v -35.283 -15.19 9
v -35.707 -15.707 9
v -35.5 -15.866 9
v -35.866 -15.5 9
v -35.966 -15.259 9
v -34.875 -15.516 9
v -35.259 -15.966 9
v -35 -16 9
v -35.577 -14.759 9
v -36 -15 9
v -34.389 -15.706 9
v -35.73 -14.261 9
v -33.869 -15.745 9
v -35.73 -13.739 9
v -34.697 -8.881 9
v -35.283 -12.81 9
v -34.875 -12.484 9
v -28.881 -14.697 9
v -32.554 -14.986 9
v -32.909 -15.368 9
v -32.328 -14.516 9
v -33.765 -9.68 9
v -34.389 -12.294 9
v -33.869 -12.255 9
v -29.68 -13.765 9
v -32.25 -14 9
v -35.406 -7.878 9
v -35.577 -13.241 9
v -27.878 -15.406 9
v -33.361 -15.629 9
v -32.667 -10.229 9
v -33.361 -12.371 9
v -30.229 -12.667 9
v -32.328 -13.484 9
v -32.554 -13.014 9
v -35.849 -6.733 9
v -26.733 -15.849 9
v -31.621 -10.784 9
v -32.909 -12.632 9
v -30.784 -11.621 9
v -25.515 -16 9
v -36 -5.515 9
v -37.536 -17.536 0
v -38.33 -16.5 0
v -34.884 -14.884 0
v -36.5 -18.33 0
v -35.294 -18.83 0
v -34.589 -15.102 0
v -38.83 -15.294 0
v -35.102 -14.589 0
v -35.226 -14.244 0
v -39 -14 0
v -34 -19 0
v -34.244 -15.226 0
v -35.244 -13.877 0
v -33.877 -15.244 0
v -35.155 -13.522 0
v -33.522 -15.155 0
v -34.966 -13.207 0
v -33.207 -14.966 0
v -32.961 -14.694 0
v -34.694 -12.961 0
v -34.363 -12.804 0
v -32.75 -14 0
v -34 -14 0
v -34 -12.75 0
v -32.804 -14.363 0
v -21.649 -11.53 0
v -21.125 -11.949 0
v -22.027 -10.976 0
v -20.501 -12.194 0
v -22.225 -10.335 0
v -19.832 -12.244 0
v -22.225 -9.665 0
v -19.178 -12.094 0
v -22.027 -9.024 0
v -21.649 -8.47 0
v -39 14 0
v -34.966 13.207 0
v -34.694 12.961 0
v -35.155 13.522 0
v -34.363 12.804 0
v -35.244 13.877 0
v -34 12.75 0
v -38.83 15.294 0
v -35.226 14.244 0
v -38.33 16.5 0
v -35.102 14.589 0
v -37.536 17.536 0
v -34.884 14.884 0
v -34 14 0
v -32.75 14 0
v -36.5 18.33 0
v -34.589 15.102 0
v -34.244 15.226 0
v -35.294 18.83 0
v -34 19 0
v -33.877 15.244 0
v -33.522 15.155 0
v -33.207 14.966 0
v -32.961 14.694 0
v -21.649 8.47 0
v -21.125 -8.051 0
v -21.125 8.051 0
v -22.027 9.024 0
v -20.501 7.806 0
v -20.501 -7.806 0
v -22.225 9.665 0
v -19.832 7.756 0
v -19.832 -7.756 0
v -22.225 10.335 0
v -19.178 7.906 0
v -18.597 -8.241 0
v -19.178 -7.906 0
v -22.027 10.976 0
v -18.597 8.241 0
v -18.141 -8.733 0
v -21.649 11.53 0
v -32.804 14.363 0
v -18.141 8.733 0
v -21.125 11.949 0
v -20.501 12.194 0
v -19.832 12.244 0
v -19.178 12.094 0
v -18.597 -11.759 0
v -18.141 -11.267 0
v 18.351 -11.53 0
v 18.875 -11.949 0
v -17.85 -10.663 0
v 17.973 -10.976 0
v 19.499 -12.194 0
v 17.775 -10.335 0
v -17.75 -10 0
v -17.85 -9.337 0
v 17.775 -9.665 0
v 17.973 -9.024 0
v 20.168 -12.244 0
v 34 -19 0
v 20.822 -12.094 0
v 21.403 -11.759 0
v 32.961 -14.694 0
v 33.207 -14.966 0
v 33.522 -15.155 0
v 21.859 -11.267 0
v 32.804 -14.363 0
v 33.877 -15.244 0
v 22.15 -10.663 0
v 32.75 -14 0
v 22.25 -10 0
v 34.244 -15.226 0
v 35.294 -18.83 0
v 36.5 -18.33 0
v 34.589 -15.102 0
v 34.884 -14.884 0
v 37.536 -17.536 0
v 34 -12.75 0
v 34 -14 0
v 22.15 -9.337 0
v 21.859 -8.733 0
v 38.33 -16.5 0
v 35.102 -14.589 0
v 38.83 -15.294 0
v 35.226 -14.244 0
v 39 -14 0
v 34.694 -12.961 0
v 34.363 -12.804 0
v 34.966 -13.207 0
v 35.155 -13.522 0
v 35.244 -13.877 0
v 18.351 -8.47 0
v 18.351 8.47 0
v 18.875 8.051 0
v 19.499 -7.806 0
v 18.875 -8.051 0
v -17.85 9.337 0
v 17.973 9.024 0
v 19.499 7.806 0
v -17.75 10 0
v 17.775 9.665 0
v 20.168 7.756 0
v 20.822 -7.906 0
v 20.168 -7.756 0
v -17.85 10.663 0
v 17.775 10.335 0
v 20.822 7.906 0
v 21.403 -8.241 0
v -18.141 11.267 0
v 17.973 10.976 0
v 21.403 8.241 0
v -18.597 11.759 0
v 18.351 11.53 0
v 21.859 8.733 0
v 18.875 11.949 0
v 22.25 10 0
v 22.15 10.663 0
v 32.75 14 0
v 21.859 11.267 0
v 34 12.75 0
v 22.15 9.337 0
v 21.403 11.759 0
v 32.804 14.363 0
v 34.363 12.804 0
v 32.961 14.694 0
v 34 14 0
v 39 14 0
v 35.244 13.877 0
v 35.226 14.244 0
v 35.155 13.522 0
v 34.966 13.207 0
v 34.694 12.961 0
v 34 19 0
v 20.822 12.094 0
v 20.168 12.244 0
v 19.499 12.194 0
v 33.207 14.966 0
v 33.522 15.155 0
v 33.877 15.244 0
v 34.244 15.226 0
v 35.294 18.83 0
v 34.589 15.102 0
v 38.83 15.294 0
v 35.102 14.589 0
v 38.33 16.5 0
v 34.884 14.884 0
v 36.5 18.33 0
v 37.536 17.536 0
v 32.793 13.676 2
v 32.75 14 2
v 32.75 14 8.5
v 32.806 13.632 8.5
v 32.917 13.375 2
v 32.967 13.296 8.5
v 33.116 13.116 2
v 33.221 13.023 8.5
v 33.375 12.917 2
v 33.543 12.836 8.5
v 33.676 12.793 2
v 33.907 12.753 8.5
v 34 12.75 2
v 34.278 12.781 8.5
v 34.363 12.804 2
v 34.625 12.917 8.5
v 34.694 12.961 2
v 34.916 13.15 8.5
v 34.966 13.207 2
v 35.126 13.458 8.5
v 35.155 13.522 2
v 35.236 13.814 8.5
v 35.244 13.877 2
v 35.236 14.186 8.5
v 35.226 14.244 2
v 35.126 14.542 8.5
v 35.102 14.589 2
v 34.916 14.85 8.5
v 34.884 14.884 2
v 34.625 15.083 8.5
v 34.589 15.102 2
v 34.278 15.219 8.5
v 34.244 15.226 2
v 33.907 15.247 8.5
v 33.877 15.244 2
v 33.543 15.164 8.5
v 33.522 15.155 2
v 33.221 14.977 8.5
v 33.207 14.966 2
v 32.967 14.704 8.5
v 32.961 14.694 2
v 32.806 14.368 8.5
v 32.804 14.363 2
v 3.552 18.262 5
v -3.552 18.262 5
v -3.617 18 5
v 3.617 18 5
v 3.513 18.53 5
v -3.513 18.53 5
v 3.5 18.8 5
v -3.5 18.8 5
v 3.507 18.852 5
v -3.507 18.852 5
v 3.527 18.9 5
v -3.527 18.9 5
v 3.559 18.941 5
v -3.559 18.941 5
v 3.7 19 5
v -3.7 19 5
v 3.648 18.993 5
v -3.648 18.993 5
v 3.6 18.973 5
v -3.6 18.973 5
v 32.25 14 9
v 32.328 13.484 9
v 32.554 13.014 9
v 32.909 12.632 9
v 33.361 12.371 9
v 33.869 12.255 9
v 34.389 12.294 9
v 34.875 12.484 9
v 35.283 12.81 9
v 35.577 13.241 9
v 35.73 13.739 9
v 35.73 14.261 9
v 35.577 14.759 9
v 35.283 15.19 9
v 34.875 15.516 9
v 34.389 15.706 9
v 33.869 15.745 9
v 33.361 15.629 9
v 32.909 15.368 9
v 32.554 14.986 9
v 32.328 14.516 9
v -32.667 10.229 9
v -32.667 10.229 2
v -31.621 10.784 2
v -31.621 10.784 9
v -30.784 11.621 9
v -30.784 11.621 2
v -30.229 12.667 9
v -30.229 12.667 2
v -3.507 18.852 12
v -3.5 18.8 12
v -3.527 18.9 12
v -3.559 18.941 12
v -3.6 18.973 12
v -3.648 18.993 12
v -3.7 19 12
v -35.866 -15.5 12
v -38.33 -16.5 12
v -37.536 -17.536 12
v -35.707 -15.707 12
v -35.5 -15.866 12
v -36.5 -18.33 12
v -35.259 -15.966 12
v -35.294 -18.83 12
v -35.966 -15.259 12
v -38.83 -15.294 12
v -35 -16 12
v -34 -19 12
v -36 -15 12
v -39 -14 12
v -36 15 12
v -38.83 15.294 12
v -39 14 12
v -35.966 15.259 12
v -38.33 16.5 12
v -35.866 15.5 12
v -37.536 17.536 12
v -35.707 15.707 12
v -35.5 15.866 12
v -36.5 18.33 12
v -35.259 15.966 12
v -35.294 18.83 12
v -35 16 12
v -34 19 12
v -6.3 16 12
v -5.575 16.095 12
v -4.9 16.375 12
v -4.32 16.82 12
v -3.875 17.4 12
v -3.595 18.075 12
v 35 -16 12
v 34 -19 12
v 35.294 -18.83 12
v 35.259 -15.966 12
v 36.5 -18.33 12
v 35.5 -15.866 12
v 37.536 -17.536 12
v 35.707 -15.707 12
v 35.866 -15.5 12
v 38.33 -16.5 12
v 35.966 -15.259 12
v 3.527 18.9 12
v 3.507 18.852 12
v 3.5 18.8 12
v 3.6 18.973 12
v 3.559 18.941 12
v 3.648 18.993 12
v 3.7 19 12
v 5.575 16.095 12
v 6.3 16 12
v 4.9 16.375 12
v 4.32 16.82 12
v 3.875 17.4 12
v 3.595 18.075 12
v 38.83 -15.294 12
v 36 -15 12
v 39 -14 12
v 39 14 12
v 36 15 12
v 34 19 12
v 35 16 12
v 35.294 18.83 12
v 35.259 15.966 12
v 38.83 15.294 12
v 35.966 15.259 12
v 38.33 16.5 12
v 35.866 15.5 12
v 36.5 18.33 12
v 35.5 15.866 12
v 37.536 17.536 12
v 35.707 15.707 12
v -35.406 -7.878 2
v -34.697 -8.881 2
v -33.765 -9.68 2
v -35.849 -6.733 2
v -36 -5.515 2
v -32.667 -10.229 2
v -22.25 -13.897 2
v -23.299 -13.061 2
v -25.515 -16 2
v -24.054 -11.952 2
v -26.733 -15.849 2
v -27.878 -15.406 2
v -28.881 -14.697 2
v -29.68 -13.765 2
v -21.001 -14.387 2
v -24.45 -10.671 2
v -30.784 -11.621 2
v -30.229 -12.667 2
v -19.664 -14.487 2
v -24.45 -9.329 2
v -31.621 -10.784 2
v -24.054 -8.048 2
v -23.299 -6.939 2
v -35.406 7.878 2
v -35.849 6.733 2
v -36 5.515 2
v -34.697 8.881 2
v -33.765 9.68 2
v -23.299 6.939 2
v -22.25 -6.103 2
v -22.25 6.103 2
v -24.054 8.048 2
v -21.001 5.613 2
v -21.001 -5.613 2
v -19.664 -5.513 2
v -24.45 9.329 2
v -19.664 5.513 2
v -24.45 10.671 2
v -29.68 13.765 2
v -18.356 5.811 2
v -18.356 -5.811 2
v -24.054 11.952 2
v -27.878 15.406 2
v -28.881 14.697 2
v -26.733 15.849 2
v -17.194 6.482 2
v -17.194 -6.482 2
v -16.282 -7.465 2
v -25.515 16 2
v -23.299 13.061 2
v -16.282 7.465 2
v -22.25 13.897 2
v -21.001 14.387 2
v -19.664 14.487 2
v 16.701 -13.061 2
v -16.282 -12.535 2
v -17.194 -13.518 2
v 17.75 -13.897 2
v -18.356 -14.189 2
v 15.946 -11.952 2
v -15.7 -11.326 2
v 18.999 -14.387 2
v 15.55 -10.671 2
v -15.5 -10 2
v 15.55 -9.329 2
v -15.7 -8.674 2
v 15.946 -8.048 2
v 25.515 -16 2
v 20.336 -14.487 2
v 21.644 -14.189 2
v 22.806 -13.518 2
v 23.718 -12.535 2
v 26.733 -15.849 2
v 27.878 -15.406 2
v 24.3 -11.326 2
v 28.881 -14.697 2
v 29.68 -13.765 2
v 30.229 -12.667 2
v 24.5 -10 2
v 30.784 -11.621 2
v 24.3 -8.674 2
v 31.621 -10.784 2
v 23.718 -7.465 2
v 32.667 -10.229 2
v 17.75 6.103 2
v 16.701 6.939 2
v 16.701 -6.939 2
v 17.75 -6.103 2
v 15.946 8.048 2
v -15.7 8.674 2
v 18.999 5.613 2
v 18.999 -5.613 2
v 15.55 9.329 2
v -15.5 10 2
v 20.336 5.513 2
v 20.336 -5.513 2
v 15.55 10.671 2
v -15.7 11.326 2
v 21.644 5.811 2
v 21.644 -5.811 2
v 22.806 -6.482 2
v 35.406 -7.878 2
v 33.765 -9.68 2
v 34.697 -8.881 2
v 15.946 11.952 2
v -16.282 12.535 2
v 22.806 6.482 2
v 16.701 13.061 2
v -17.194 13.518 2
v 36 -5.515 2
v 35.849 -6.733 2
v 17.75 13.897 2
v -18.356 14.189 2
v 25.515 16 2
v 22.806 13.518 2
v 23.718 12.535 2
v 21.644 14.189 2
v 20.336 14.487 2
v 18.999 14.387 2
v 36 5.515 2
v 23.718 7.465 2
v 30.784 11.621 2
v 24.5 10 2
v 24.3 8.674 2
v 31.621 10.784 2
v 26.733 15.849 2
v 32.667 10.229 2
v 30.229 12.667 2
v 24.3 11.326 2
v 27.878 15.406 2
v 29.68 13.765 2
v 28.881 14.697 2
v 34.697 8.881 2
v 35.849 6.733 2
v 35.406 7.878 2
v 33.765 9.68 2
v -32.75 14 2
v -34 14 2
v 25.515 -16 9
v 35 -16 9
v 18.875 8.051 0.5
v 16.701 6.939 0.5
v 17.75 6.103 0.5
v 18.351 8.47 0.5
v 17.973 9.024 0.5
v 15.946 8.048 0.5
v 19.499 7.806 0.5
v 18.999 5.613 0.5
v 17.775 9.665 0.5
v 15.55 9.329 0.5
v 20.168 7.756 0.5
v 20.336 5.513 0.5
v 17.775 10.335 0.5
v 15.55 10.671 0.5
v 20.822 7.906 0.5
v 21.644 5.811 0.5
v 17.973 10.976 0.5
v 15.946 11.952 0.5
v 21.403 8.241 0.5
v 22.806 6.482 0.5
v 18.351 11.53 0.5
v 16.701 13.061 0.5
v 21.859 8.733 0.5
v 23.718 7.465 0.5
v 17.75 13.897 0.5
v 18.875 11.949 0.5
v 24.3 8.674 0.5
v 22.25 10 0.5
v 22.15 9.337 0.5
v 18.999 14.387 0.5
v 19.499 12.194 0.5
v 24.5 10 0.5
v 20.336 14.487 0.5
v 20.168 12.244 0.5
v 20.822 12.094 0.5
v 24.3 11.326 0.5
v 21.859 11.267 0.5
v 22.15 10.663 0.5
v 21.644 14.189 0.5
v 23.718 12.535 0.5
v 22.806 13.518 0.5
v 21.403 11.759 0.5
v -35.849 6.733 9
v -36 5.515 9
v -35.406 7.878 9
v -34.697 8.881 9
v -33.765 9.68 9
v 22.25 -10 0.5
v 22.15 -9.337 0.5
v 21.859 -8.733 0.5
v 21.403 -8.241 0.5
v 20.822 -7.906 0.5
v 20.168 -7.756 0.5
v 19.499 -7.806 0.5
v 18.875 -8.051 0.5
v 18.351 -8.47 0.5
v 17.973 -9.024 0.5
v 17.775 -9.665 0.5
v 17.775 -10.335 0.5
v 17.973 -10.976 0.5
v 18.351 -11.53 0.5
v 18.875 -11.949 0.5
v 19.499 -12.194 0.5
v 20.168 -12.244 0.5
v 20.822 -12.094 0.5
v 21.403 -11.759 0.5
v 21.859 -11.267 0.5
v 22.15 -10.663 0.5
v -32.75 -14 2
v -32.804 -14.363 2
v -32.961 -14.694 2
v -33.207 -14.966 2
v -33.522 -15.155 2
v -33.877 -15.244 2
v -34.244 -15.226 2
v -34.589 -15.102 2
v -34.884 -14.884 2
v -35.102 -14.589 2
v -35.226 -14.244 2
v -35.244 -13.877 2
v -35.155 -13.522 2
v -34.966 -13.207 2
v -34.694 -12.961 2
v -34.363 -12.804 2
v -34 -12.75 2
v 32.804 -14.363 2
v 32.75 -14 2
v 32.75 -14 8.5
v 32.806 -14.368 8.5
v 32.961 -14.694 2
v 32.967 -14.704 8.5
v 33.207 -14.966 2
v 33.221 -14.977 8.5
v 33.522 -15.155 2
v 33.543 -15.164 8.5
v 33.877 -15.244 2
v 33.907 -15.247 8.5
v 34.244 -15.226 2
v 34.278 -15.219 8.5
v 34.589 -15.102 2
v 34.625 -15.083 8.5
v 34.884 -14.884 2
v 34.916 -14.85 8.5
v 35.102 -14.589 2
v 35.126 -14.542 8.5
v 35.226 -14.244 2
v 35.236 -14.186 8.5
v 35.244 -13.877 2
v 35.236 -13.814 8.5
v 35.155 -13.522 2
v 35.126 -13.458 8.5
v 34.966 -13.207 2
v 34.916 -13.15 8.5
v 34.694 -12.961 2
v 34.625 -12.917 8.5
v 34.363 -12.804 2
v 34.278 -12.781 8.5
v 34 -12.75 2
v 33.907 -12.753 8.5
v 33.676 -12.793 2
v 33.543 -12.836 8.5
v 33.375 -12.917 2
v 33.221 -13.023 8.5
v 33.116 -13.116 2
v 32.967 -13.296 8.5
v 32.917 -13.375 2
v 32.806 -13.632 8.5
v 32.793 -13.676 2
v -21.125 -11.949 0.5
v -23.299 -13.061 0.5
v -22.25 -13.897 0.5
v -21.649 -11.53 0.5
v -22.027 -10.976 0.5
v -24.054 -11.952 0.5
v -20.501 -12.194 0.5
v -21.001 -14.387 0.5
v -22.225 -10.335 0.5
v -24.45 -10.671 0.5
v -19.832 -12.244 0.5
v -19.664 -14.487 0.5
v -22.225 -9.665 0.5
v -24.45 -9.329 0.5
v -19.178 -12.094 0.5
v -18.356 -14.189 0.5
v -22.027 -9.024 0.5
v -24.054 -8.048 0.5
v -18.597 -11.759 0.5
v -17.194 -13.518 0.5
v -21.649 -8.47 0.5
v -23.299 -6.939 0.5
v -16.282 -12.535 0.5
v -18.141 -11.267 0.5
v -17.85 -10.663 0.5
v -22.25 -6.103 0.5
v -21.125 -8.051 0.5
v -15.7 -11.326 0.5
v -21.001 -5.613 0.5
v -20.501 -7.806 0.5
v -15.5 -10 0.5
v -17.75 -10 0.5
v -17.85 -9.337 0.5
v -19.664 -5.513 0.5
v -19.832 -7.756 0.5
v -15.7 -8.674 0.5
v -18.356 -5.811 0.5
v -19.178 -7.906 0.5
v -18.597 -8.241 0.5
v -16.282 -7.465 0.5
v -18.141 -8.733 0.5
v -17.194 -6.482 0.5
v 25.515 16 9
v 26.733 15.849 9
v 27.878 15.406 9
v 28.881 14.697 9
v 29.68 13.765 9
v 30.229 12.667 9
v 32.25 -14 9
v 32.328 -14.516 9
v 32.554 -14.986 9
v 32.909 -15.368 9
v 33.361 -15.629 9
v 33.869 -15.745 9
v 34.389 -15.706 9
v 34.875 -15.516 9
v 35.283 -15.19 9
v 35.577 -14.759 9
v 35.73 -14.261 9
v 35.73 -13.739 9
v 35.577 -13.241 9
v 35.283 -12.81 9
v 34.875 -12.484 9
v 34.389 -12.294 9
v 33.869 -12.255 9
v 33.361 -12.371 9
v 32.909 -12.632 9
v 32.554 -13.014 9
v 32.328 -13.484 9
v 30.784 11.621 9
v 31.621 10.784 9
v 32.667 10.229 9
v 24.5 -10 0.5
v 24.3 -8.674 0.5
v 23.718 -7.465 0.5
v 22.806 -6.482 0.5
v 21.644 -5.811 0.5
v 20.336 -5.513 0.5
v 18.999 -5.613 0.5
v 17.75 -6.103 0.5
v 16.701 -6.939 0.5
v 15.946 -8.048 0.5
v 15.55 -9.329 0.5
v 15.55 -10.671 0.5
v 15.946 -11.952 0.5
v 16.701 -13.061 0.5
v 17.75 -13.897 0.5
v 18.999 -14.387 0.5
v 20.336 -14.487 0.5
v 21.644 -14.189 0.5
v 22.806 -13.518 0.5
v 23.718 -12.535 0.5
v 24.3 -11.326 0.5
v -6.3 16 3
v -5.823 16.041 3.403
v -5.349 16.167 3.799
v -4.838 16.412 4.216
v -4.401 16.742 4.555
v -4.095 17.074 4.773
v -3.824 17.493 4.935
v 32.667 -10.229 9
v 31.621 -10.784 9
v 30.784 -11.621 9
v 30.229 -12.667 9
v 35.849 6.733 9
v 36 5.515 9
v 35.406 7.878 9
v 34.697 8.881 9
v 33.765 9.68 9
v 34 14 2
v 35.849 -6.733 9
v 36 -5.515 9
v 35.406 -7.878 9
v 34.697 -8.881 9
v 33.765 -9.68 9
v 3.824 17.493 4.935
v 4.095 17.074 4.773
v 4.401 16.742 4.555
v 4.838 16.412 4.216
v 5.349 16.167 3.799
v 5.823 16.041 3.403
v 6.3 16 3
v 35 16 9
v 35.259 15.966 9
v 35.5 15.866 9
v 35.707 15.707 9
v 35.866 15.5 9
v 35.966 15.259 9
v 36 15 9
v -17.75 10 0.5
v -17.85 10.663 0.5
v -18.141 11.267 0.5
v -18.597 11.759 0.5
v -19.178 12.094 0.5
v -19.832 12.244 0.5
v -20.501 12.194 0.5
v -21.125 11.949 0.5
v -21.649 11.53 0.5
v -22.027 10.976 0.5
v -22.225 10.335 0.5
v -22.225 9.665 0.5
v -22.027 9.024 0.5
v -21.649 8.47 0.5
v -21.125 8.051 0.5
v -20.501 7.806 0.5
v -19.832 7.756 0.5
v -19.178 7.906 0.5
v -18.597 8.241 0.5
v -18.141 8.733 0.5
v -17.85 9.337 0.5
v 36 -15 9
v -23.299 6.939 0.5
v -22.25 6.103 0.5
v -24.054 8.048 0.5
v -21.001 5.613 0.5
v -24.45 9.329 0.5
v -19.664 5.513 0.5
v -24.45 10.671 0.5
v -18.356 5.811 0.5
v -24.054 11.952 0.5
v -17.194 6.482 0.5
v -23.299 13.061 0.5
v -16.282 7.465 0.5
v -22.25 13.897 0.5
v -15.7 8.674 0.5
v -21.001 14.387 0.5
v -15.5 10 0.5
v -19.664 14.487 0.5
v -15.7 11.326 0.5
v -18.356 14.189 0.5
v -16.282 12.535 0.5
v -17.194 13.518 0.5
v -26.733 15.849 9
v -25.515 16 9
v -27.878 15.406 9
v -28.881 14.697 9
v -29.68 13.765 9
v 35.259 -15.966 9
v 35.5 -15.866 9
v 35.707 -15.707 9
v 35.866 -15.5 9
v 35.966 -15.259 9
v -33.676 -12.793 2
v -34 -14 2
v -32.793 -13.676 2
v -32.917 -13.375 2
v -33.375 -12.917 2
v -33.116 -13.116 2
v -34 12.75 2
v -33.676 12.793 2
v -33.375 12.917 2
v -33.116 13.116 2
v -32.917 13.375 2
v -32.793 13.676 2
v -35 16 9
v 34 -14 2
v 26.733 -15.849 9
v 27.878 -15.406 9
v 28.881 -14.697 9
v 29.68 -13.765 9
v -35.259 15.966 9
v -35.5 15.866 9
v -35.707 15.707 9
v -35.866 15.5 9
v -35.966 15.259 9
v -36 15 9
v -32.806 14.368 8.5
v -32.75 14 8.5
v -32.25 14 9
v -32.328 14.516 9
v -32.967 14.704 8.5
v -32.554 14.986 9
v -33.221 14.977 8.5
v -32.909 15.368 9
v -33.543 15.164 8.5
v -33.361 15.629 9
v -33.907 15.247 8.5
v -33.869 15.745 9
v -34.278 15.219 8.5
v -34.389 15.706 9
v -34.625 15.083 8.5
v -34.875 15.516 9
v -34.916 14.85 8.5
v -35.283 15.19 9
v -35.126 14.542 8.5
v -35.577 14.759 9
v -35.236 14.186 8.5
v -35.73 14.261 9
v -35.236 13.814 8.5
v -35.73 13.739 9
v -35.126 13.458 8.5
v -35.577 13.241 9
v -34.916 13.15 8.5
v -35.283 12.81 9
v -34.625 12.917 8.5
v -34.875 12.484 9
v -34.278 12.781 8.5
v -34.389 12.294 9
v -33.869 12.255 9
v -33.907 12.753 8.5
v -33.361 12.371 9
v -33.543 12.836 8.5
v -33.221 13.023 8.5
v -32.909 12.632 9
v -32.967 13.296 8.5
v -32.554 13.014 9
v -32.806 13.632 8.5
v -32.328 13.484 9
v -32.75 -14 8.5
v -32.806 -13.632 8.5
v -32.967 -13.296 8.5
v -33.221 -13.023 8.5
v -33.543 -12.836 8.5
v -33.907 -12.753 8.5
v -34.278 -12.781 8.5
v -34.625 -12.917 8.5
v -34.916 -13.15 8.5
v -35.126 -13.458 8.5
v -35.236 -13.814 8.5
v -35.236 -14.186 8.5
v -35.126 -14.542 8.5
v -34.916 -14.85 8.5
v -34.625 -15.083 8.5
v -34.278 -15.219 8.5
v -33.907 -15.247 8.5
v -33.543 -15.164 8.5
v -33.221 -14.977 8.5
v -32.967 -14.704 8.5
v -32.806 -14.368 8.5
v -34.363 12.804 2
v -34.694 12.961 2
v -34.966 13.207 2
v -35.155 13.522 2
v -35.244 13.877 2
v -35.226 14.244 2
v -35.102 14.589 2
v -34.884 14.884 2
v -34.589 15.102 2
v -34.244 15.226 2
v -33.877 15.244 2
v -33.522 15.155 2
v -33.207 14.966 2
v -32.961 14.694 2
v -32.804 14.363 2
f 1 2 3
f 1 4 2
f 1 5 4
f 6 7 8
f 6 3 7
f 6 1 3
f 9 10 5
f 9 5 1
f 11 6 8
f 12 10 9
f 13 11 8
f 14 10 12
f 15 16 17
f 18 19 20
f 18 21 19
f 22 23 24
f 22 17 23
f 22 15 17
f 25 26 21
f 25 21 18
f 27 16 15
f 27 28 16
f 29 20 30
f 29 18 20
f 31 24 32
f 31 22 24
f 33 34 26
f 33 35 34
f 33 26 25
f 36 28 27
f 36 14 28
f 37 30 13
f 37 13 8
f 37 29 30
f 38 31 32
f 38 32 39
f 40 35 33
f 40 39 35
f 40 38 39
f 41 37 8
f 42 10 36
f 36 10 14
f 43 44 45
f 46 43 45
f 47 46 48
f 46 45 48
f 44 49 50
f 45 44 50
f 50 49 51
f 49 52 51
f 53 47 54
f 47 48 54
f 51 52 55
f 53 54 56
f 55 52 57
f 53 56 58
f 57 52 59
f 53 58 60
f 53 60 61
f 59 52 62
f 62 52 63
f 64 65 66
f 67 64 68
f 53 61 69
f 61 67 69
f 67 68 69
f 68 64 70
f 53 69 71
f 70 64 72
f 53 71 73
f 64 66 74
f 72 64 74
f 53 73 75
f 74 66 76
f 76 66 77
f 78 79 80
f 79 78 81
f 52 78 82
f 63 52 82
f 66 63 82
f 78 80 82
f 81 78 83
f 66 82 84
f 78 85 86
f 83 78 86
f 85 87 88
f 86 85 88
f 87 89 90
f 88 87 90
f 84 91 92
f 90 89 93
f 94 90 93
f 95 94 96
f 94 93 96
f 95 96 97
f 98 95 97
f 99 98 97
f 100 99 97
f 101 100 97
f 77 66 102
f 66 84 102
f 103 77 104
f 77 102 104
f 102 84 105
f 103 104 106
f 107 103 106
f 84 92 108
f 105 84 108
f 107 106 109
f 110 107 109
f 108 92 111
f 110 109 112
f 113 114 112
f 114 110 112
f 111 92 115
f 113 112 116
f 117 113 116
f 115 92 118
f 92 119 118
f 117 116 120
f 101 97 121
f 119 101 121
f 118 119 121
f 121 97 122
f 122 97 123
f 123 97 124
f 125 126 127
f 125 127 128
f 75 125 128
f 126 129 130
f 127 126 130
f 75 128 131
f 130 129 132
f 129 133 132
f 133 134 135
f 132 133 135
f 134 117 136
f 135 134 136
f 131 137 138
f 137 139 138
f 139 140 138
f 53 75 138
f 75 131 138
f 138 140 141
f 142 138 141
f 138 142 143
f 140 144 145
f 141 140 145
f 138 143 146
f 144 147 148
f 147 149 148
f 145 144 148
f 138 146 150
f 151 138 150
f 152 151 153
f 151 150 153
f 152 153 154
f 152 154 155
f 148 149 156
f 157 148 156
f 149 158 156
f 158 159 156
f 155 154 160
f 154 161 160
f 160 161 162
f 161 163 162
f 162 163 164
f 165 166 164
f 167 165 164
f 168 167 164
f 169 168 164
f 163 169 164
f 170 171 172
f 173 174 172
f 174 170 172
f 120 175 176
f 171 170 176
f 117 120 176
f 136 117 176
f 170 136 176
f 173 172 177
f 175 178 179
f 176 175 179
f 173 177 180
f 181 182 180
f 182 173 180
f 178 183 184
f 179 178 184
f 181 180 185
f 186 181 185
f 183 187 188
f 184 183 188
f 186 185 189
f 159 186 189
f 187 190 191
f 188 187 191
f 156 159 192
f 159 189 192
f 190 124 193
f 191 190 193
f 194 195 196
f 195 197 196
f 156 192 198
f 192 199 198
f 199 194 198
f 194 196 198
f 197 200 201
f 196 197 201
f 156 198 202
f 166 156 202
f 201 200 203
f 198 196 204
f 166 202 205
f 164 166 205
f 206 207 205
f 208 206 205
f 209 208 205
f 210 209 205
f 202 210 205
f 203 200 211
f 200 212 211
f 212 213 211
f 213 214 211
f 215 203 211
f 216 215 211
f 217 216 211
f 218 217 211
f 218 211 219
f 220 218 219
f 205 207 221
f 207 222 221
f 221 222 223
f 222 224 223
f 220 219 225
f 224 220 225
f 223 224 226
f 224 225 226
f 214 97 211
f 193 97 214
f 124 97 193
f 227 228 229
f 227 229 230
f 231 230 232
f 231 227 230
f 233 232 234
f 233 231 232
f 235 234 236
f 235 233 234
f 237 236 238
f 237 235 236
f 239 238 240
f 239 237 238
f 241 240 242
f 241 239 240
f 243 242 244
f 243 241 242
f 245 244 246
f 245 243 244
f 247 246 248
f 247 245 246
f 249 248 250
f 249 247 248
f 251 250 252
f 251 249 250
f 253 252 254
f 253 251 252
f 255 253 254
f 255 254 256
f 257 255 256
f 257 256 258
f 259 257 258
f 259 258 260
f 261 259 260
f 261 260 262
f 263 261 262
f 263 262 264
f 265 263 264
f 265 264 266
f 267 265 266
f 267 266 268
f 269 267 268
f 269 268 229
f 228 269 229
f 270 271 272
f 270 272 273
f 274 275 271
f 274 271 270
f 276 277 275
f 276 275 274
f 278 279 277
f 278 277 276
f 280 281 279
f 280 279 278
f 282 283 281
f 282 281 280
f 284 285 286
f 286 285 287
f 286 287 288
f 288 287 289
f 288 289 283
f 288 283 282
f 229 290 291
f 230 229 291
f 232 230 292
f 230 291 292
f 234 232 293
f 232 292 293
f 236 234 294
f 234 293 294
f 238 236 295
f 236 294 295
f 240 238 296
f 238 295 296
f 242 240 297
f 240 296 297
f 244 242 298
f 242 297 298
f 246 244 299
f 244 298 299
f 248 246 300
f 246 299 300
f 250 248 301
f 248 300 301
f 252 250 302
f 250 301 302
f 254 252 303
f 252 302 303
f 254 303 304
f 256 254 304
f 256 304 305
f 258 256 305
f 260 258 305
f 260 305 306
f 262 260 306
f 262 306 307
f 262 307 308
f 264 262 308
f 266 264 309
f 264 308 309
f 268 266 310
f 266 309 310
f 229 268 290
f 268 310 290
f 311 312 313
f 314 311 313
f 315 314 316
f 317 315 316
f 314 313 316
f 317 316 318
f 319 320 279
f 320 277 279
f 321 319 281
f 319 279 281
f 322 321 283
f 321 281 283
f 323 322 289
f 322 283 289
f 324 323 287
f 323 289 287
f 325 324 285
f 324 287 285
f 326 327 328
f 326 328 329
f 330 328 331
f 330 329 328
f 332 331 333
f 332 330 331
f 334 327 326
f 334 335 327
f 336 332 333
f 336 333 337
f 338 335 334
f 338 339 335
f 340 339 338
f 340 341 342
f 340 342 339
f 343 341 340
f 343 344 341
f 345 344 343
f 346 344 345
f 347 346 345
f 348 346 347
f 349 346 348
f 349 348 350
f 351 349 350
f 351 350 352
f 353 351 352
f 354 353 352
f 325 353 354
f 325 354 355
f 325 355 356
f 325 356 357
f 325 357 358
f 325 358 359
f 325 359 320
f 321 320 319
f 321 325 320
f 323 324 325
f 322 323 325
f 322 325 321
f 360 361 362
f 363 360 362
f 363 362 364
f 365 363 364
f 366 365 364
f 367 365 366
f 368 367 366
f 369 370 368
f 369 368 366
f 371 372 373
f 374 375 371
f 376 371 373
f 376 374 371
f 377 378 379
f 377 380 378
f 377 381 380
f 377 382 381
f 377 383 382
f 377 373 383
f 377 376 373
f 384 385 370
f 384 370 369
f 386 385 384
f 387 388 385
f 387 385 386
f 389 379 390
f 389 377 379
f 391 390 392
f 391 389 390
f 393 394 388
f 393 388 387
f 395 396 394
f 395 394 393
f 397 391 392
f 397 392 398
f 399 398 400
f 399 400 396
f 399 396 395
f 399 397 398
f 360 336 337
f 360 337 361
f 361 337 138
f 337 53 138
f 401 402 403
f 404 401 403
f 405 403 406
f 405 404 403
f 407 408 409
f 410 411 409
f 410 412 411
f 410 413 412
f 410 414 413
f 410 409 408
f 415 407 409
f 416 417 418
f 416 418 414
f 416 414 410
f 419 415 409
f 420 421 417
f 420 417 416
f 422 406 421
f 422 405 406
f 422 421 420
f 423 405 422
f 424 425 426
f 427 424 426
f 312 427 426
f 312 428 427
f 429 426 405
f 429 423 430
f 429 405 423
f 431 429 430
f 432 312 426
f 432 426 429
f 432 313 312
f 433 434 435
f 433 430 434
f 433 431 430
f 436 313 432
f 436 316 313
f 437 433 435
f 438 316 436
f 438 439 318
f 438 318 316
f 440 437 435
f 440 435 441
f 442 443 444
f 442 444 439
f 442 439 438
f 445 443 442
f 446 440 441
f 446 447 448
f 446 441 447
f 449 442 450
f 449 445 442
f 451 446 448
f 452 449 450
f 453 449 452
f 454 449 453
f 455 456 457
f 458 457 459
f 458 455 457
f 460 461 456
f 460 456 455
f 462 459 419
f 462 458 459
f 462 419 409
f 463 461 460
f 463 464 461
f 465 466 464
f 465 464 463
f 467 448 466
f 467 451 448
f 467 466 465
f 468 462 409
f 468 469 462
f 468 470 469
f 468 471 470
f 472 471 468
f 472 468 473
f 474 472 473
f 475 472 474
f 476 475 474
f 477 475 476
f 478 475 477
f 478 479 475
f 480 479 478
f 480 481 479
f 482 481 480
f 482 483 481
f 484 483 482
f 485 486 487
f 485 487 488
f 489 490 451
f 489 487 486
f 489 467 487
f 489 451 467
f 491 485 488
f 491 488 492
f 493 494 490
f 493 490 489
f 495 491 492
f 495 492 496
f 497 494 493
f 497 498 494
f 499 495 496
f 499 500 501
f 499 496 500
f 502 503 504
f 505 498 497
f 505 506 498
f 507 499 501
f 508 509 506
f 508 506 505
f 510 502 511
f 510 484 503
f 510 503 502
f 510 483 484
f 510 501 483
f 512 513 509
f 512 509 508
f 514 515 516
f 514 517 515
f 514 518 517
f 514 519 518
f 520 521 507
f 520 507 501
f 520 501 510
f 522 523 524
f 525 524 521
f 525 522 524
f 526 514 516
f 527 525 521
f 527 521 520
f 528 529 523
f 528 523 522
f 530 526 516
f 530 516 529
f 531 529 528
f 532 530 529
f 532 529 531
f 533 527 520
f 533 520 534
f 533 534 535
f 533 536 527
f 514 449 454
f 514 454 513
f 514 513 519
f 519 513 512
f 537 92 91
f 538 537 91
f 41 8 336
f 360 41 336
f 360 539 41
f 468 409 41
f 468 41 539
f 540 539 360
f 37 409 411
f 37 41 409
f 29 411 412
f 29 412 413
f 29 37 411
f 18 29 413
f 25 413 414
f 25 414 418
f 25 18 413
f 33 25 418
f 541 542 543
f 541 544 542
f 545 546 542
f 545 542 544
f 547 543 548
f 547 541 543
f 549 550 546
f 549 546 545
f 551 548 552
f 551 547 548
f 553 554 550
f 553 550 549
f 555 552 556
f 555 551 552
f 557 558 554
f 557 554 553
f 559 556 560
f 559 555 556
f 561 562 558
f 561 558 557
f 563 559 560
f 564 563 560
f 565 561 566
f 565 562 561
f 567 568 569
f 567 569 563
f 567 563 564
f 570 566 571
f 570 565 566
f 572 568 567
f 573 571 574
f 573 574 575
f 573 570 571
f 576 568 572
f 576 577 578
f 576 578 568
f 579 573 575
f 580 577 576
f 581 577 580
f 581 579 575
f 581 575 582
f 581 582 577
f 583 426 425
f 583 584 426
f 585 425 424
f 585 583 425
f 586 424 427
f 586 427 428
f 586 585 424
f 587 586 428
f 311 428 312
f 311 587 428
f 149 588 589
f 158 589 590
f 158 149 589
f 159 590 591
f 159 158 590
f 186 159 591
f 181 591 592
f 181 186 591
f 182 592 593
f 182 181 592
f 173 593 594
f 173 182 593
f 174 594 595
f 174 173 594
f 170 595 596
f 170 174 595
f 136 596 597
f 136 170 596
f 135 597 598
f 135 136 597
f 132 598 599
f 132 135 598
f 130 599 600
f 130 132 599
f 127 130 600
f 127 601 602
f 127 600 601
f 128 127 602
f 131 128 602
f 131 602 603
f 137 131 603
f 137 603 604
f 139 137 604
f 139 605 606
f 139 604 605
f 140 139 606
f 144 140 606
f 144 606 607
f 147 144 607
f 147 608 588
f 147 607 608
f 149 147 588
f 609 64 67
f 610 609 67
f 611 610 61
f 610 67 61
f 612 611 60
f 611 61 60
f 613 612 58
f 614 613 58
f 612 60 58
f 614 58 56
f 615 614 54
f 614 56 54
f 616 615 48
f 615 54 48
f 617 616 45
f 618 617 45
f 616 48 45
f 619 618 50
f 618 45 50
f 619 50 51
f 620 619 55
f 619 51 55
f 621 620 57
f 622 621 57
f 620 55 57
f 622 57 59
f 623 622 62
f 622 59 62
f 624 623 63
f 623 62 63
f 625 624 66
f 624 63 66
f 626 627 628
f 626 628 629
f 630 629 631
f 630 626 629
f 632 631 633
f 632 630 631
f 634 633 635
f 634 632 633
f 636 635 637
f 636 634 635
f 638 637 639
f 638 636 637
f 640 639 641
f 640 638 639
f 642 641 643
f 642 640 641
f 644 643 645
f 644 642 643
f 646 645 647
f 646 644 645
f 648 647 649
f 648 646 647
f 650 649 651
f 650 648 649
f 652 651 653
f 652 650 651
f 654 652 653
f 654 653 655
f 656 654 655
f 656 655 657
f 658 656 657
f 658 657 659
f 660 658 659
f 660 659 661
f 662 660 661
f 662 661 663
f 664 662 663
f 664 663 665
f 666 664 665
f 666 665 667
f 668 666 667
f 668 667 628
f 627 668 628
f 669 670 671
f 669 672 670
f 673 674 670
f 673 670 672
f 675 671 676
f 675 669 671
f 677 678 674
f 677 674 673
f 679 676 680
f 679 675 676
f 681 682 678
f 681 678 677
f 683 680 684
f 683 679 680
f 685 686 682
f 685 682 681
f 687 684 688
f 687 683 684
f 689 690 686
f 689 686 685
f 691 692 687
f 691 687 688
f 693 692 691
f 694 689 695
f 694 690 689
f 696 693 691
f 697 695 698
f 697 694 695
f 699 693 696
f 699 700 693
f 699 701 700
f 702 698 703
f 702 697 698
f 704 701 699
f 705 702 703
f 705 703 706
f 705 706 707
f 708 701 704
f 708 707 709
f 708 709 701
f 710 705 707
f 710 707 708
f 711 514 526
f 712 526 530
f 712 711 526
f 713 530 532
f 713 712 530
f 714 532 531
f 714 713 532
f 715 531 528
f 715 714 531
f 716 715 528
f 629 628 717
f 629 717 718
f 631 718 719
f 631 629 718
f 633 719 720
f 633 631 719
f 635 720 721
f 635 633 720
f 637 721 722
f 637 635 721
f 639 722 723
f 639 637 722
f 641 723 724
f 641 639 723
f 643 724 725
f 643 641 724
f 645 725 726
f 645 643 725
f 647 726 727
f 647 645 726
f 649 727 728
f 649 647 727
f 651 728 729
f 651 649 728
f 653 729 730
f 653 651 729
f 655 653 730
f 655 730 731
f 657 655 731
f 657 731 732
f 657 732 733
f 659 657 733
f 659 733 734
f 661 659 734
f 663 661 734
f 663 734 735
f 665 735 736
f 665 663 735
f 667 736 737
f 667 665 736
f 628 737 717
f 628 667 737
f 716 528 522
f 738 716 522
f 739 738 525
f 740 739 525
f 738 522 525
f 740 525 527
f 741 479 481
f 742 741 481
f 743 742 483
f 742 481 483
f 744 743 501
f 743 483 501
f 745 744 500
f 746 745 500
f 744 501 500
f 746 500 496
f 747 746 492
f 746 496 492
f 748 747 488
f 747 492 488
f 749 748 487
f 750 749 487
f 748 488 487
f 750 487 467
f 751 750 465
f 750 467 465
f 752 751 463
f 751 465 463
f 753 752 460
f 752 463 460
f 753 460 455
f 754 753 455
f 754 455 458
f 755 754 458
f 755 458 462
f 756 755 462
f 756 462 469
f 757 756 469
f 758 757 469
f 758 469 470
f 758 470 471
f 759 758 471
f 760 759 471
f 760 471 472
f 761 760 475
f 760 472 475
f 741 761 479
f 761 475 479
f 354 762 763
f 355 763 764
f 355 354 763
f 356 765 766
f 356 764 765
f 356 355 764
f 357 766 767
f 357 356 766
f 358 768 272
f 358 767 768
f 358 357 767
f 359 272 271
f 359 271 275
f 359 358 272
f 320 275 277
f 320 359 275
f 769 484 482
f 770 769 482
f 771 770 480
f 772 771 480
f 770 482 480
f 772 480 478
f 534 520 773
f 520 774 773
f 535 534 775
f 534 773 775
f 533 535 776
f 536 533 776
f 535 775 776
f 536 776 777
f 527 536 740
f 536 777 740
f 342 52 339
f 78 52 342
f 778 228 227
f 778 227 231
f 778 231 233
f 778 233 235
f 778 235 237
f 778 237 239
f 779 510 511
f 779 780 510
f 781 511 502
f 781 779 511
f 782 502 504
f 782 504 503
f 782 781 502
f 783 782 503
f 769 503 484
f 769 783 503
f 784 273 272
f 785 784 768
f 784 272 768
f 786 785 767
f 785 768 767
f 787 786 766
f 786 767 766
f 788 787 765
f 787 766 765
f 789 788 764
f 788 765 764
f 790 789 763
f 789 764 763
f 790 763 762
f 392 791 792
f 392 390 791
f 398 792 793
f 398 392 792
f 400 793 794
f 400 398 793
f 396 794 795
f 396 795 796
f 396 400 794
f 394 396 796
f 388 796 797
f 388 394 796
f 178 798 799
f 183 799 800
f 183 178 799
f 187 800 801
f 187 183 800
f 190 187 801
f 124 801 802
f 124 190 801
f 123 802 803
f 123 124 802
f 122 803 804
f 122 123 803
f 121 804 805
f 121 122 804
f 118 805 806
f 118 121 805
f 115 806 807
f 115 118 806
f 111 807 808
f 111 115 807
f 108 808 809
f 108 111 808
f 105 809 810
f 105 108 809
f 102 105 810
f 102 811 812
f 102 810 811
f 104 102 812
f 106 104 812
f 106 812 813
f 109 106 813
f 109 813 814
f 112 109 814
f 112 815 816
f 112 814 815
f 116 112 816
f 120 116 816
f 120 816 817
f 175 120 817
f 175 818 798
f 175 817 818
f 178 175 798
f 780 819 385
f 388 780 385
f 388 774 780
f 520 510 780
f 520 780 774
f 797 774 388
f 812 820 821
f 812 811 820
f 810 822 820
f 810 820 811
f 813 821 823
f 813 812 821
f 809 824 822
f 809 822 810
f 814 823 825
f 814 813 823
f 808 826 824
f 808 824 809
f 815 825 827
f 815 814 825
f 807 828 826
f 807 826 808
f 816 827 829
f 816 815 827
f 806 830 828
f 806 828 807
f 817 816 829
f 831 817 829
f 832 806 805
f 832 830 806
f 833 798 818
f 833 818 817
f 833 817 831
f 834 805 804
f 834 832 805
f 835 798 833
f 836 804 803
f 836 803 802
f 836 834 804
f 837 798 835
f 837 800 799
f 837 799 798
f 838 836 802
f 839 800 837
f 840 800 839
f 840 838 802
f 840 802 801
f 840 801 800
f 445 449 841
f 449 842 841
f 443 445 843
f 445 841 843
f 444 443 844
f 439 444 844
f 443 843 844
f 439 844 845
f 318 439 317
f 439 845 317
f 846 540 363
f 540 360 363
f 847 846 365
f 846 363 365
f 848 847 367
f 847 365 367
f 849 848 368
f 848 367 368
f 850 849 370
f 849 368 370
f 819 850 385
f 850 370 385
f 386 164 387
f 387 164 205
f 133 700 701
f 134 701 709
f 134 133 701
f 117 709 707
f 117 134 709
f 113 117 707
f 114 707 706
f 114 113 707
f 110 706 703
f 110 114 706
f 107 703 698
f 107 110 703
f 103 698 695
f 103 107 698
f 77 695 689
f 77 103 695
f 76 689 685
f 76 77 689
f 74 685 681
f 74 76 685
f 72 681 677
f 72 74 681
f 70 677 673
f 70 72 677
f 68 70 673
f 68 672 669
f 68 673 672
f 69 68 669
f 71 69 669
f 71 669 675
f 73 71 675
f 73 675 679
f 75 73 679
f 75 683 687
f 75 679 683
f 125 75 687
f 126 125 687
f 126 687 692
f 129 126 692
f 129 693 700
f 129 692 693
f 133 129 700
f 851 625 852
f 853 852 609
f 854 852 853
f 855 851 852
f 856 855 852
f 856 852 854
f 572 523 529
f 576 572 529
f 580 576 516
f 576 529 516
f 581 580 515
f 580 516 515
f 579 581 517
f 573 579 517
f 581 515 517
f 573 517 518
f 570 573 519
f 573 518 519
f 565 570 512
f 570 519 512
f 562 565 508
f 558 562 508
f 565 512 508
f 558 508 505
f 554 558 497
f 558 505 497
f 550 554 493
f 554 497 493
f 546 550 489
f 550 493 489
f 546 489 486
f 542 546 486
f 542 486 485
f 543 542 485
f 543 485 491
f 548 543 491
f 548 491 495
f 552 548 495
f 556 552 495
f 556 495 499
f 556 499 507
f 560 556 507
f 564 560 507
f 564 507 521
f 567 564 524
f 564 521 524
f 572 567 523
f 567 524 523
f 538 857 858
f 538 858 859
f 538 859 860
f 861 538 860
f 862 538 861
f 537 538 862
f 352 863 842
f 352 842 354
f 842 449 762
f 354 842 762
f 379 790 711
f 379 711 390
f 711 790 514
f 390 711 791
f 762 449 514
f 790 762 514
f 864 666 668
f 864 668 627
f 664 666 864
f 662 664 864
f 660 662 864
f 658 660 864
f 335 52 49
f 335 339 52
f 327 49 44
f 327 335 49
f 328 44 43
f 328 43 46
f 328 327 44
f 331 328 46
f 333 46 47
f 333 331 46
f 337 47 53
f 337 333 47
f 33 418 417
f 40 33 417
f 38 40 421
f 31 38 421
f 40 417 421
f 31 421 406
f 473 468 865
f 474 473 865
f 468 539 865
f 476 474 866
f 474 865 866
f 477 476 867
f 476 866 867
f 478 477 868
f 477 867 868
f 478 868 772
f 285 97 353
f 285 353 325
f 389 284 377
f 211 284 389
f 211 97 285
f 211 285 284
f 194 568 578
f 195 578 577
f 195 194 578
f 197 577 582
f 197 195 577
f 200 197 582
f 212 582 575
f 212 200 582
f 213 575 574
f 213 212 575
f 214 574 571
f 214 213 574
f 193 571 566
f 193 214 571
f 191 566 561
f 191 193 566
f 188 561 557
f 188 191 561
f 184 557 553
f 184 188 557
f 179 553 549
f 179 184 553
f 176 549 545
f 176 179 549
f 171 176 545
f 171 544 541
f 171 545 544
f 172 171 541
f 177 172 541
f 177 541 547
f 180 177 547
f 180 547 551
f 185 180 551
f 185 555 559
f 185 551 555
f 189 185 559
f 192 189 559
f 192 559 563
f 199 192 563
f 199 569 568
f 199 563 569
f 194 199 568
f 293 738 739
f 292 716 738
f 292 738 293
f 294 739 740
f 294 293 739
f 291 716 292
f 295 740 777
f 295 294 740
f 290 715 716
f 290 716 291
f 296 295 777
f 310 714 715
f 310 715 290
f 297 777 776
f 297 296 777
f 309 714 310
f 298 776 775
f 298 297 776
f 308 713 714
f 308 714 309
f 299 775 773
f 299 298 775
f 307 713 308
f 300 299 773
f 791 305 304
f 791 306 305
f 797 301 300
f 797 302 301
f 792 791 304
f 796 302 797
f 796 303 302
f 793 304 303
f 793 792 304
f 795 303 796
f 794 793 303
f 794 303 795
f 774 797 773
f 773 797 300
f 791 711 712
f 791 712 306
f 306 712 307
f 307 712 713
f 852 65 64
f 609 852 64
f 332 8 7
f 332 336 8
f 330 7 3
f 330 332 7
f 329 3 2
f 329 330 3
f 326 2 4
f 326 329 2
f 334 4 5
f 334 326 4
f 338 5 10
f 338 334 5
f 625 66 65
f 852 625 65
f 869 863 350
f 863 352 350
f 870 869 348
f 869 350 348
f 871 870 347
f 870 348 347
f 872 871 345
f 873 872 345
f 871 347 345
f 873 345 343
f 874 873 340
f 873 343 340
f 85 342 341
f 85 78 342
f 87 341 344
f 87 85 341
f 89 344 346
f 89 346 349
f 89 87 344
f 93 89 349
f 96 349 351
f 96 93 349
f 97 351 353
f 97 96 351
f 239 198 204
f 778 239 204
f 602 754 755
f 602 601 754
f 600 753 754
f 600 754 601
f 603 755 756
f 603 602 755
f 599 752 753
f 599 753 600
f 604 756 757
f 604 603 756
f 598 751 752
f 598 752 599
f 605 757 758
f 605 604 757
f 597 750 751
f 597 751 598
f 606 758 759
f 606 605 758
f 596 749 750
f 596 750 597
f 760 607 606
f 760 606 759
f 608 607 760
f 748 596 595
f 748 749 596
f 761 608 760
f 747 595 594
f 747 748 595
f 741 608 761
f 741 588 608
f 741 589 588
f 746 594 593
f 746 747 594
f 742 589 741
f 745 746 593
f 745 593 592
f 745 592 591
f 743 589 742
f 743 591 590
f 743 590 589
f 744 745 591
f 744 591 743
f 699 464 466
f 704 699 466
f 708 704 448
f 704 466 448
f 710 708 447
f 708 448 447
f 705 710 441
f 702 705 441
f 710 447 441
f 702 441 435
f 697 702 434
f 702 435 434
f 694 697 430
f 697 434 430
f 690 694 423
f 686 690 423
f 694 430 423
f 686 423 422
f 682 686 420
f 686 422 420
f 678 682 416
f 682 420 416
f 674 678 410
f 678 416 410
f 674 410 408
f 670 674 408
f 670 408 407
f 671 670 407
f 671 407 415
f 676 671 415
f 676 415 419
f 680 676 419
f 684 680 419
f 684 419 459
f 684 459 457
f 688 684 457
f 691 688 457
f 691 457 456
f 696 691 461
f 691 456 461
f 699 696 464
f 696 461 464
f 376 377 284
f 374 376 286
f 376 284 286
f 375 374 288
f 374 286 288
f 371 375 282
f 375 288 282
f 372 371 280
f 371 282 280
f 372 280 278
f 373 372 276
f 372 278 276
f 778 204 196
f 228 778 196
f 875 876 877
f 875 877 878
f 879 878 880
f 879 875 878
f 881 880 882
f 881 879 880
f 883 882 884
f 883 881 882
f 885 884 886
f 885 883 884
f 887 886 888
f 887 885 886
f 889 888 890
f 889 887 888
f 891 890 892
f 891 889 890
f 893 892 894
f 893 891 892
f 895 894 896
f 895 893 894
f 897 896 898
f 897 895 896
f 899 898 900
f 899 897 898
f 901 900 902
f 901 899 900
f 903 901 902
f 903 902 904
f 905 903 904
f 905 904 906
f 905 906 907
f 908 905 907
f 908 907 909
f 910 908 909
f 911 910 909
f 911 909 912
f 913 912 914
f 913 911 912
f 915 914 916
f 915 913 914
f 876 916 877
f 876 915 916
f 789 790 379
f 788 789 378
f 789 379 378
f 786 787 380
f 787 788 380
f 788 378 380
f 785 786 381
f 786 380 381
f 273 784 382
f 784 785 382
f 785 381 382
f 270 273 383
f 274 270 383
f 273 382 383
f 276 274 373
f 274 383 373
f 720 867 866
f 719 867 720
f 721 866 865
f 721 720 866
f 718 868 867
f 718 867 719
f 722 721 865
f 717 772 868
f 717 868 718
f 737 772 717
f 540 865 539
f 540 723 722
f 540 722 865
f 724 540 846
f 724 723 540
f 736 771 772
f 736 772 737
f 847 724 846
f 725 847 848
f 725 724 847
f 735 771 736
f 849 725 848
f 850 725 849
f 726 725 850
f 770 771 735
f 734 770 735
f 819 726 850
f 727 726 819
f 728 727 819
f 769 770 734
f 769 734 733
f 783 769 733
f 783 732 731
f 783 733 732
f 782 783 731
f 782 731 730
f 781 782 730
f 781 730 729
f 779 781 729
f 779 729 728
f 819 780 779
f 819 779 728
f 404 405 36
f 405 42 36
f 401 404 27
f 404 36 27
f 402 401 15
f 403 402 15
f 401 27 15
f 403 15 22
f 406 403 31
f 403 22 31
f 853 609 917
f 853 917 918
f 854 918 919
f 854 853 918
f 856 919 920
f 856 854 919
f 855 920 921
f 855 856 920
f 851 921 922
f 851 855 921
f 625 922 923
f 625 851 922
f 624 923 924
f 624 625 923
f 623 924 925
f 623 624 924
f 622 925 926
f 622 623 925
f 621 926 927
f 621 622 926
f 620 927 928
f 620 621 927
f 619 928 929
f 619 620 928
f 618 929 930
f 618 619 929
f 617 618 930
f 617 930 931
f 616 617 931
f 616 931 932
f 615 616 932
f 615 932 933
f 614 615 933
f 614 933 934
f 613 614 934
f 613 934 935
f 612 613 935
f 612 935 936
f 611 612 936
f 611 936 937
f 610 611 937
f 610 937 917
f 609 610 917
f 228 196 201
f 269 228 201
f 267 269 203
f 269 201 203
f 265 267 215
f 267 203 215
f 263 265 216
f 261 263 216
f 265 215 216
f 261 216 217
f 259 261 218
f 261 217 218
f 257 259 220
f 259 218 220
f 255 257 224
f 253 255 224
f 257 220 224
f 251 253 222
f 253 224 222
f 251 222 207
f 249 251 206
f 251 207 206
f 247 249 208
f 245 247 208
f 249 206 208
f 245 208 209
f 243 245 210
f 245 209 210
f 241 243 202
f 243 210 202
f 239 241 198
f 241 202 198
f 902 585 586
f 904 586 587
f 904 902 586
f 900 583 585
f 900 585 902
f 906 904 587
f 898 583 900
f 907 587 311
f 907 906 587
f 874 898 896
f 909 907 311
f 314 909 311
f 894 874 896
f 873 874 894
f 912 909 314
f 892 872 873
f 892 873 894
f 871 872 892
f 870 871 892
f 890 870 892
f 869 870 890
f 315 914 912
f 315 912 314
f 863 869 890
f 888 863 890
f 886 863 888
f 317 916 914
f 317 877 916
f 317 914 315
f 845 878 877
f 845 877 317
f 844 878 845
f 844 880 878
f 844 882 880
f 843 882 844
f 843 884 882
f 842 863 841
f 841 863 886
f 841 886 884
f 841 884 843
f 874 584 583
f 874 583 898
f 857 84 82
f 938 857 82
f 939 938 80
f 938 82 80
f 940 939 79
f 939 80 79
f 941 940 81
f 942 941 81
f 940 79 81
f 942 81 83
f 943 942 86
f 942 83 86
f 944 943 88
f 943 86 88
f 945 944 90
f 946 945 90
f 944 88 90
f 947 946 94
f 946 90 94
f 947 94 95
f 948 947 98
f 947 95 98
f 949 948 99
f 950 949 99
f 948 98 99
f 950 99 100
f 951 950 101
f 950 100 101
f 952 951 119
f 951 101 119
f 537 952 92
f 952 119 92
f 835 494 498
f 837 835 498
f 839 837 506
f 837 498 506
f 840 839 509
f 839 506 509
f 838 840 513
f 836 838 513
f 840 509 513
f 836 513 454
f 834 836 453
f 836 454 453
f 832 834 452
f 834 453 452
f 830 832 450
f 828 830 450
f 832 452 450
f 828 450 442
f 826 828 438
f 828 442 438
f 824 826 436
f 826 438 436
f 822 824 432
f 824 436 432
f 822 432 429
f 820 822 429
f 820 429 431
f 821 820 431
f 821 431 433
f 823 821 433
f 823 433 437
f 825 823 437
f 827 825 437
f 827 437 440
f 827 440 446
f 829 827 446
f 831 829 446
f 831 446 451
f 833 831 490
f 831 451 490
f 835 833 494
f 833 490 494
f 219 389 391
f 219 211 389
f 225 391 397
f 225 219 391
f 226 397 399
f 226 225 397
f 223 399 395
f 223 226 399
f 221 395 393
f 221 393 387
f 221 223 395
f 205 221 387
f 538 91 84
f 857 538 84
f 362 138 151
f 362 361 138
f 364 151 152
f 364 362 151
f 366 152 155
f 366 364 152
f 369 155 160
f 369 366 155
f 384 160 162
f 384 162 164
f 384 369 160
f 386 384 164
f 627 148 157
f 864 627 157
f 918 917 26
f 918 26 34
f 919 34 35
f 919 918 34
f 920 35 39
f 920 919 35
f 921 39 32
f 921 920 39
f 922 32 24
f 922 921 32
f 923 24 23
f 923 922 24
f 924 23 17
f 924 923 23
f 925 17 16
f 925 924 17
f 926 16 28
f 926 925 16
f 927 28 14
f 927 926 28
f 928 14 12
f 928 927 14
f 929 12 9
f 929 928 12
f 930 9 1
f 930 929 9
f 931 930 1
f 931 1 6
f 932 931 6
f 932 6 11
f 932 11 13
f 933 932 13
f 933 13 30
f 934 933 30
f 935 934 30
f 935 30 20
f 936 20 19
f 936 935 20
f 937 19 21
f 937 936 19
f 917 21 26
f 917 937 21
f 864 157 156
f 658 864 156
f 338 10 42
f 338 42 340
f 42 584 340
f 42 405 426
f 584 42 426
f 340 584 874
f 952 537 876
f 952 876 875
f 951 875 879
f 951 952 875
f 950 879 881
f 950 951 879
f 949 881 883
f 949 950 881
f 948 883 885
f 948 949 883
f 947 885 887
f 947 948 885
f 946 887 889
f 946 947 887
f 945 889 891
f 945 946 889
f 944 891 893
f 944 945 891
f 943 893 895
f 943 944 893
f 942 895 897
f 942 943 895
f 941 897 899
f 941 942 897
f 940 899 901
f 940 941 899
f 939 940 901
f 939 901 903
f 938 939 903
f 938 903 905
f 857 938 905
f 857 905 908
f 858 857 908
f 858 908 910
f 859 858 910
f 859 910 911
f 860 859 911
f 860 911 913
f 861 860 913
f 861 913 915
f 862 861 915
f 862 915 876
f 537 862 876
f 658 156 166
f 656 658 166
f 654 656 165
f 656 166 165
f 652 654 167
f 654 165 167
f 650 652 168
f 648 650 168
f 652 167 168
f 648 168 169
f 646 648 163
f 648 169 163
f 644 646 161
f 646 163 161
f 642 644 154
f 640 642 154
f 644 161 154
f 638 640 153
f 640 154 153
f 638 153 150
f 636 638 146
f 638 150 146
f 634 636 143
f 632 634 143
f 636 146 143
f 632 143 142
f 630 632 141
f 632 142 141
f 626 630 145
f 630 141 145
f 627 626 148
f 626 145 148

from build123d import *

# Parameters (mm, degrees)
SCHIZZO1_W                   = 78
SCHIZZO1_H                   = 38
SCHIZZO1_R                   = 2.25
ESTRUSIONE_ESTRUSIONE1_DEPTH = 2
SCHIZZO2_W                   = 78
SCHIZZO2_H                   = 38
SCHIZZO2_R                   = 1.25
ESTRUSIONE_ESTRUSIONE2_DEPTH = 7
SCHIZZO3_W                   = 78
SCHIZZO3_H                   = 38
SCHIZZO3_W_2                 = 72
SCHIZZO3_H_2                 = 32
ESTRUSIONE_ESTRUSIONE3_DEPTH = 3
SMUSSO1_SIZE                 = 0.5
RACCORDO1_R                  = 5
SCHIZZO4_R                   = 4.5
TAGLIO_ESTRUSIONE1_DEPTH     = 1.5
RACCORDO2_R                  = 5
RACCORDO3_R                  = 1
TAGLIO_ESTRUSIONE2_REACH     = 57.758
SCHIZZO5_W                   = 7
SCHIZZO5_H                   = 7
RACCORDO4_R                  = 2.8
RACCORDO5_R                  = 0.2
RACCORDO6_R                  = 2


with BuildPart() as part:
    # Schizzo1 → Estrusione-Estrusione1 (new body)
    with BuildSketch(Plane.XY):
        Rectangle(SCHIZZO1_W, SCHIZZO1_H)
        with BuildLine():
            ThreePointArc((-34, 12.75), (-34.883883476, 14.883883476), (-32.75, 14))
            Line((-32.75, 14), (-34, 14))
            Line((-34, 14), (-34, 12.75))
        make_face(mode=Mode.SUBTRACT)
        with BuildLine():
            ThreePointArc((32.75, 14), (34.883883476, 14.883883476), (34, 12.75))
            Line((34, 12.75), (34, 14))
            Line((34, 14), (32.75, 14))
        make_face(mode=Mode.SUBTRACT)
        with BuildLine():
            ThreePointArc((34, -12.75), (34.883883476, -14.883883476), (32.75, -14))
            Line((32.75, -14), (34, -14))
            Line((34, -14), (34, -12.75))
        make_face(mode=Mode.SUBTRACT)
        with BuildLine():
            ThreePointArc((-32.75, -14), (-34.883883476, -14.883883476), (-34, -12.75))
            Line((-34, -12.75), (-34, -14))
            Line((-34, -14), (-32.75, -14))
        make_face(mode=Mode.SUBTRACT)
        with Locations((20, 10)):
            Circle(SCHIZZO1_R, mode=Mode.SUBTRACT)
        with Locations((-20, 10)):
            Circle(SCHIZZO1_R, mode=Mode.SUBTRACT)
        with Locations((20, -10)):
            Circle(SCHIZZO1_R, mode=Mode.SUBTRACT)
        with Locations((-20, -10)):
            Circle(SCHIZZO1_R, mode=Mode.SUBTRACT)
    extrude(amount=ESTRUSIONE_ESTRUSIONE1_DEPTH)

    # Schizzo2 → Estrusione-Estrusione2 (add)
    with BuildSketch(Plane.XY.offset(2)):
        Rectangle(SCHIZZO2_W, SCHIZZO2_H)
        with BuildLine():
            ThreePointArc((-36, 10.535898385), (-31.171572875, 11.171572875), (-30.535898385, 16))
            Line((-30.535898385, 16), (30.535898385, 16))
            ThreePointArc((30.535898385, 16), (31.171572875, 11.171572875), (36, 10.535898385))
            Line((36, 10.535898385), (36, -10.535898385))
            ThreePointArc((36, -10.535898385), (31.171572875, -11.171572875), (30.535898385, -16))
            Line((30.535898385, -16), (-30.535898385, -16))
            ThreePointArc((-30.535898385, -16), (-31.171572875, -11.171572875), (-36, -10.535898385))
            Line((-36, -10.535898385), (-36, 10.535898385))
        make_face(mode=Mode.SUBTRACT)
        with Locations((-34, 14)):
            Circle(SCHIZZO2_R, mode=Mode.SUBTRACT)
        with Locations((-34, -14)):
            Circle(SCHIZZO2_R, mode=Mode.SUBTRACT)
        with Locations(Location((34, -14, 0), (0, 0, 180))):
            Circle(SCHIZZO2_R, mode=Mode.SUBTRACT)
        with Locations(Location((34, 14, 0), (0, 0, 180))):
            Circle(SCHIZZO2_R, mode=Mode.SUBTRACT)
    extrude(amount=ESTRUSIONE_ESTRUSIONE2_DEPTH)

    # Schizzo3 → Estrusione-Estrusione3 (add)
    with BuildSketch(Plane.XY.offset(9)):
        Rectangle(SCHIZZO3_W, SCHIZZO3_H)
        Rectangle(SCHIZZO3_W_2, SCHIZZO3_H_2, mode=Mode.SUBTRACT)
    extrude(amount=ESTRUSIONE_ESTRUSIONE3_DEPTH)

    # Smusso1
    smusso1_edges = [part.edges().sort_by_distance(p)[0] for p in [
        (35.25, -14, 9),
        (-35.25, -14, 9),
        (-35.25, 14, 9),
        (35.25, 14, 9),
    ]]
    chamfer(smusso1_edges, length=SMUSSO1_SIZE)

    # Raccordo1
    raccordo1_edges = [part.edges().sort_by_distance(p)[0] for p in [
        (39, 19, 6),
        (39, -19, 6),
        (-39, -19, 6),
        (-39, 19, 6),
    ]]
    fillet(raccordo1_edges, radius=RACCORDO1_R)

    # Schizzo4 → Taglio-Estrusione1 (cut)
    with BuildSketch(Plane.XY.offset(2)):
        with Locations((-20, 10)):
            Circle(SCHIZZO4_R)
        with Locations((20, 10)):
            Circle(SCHIZZO4_R)
        with Locations((20, -10)):
            Circle(SCHIZZO4_R)
        with Locations((-20, -10)):
            Circle(SCHIZZO4_R)
    extrude(amount=-TAGLIO_ESTRUSIONE1_DEPTH, mode=Mode.SUBTRACT)

    # Raccordo2
    raccordo2_edges = [part.edges().sort_by_distance(p)[0] for p in [
        (30.535898385, 16, 5.5),
        (36, 10.535898385, 5.5),
        (36, -10.535898385, 5.5),
        (30.535898385, -16, 5.5),
        (-30.535898385, -16, 5.5),
        (-36, -10.535898385, 5.5),
        (-36, 10.535898385, 5.5),
        (-30.535898385, 16, 5.5),
    ]]
    fillet(raccordo2_edges, radius=RACCORDO2_R)

    # Raccordo3
    raccordo3_edges = [part.edges().sort_by_distance(p)[0] for p in [
        (-36, 16, 10.5),
        (-36, -16, 10.5),
        (36, -16, 10.5),
        (36, 16, 10.5),
    ]]
    fillet(raccordo3_edges, radius=RACCORDO3_R)

    # Schizzo5 → Taglio-Estrusione2 (cut, up to next)
    with BuildSketch(Plane(origin=(0, 19, 0), x_dir=(1, 0, 0), z_dir=(0, 1, 0)), mode=Mode.PRIVATE) as taglio_estrusione2_sk1:
        with Locations((0, -8.5)):
            Rectangle(SCHIZZO5_W, SCHIZZO5_H)
    taglio_estrusione2_tool1 = extrude(taglio_estrusione2_sk1.sketch, amount=-TAGLIO_ESTRUSIONE2_REACH, mode=Mode.PRIVATE) & part.part
    add(taglio_estrusione2_tool1.solids().sort_by_distance((0, 19, 8.5))[0], mode=Mode.SUBTRACT)

    # Raccordo4
    raccordo4_edges = [part.edges().sort_by_distance(p)[0] for p in [
        (3.5, 16, 8.5),
        (-3.5, 16, 8.5),
    ]]
    fillet(raccordo4_edges, radius=RACCORDO4_R)

    # Raccordo5
    raccordo5_edges = [part.edges().sort_by_distance(p)[0] for p in [
        (-3.5, 19, 8.5),
        (3.5, 19, 8.5),
    ]]
    fillet(raccordo5_edges, radius=RACCORDO5_R - 0.0001)  # a hair under: the kernel refuses the full size

    # Raccordo6
    raccordo6_edges = [part.edges().sort_by_distance(p)[0] for p in [
        (0, 16, 5),
    ]]
    fillet(raccordo6_edges, radius=RACCORDO6_R)


solid = part.part
